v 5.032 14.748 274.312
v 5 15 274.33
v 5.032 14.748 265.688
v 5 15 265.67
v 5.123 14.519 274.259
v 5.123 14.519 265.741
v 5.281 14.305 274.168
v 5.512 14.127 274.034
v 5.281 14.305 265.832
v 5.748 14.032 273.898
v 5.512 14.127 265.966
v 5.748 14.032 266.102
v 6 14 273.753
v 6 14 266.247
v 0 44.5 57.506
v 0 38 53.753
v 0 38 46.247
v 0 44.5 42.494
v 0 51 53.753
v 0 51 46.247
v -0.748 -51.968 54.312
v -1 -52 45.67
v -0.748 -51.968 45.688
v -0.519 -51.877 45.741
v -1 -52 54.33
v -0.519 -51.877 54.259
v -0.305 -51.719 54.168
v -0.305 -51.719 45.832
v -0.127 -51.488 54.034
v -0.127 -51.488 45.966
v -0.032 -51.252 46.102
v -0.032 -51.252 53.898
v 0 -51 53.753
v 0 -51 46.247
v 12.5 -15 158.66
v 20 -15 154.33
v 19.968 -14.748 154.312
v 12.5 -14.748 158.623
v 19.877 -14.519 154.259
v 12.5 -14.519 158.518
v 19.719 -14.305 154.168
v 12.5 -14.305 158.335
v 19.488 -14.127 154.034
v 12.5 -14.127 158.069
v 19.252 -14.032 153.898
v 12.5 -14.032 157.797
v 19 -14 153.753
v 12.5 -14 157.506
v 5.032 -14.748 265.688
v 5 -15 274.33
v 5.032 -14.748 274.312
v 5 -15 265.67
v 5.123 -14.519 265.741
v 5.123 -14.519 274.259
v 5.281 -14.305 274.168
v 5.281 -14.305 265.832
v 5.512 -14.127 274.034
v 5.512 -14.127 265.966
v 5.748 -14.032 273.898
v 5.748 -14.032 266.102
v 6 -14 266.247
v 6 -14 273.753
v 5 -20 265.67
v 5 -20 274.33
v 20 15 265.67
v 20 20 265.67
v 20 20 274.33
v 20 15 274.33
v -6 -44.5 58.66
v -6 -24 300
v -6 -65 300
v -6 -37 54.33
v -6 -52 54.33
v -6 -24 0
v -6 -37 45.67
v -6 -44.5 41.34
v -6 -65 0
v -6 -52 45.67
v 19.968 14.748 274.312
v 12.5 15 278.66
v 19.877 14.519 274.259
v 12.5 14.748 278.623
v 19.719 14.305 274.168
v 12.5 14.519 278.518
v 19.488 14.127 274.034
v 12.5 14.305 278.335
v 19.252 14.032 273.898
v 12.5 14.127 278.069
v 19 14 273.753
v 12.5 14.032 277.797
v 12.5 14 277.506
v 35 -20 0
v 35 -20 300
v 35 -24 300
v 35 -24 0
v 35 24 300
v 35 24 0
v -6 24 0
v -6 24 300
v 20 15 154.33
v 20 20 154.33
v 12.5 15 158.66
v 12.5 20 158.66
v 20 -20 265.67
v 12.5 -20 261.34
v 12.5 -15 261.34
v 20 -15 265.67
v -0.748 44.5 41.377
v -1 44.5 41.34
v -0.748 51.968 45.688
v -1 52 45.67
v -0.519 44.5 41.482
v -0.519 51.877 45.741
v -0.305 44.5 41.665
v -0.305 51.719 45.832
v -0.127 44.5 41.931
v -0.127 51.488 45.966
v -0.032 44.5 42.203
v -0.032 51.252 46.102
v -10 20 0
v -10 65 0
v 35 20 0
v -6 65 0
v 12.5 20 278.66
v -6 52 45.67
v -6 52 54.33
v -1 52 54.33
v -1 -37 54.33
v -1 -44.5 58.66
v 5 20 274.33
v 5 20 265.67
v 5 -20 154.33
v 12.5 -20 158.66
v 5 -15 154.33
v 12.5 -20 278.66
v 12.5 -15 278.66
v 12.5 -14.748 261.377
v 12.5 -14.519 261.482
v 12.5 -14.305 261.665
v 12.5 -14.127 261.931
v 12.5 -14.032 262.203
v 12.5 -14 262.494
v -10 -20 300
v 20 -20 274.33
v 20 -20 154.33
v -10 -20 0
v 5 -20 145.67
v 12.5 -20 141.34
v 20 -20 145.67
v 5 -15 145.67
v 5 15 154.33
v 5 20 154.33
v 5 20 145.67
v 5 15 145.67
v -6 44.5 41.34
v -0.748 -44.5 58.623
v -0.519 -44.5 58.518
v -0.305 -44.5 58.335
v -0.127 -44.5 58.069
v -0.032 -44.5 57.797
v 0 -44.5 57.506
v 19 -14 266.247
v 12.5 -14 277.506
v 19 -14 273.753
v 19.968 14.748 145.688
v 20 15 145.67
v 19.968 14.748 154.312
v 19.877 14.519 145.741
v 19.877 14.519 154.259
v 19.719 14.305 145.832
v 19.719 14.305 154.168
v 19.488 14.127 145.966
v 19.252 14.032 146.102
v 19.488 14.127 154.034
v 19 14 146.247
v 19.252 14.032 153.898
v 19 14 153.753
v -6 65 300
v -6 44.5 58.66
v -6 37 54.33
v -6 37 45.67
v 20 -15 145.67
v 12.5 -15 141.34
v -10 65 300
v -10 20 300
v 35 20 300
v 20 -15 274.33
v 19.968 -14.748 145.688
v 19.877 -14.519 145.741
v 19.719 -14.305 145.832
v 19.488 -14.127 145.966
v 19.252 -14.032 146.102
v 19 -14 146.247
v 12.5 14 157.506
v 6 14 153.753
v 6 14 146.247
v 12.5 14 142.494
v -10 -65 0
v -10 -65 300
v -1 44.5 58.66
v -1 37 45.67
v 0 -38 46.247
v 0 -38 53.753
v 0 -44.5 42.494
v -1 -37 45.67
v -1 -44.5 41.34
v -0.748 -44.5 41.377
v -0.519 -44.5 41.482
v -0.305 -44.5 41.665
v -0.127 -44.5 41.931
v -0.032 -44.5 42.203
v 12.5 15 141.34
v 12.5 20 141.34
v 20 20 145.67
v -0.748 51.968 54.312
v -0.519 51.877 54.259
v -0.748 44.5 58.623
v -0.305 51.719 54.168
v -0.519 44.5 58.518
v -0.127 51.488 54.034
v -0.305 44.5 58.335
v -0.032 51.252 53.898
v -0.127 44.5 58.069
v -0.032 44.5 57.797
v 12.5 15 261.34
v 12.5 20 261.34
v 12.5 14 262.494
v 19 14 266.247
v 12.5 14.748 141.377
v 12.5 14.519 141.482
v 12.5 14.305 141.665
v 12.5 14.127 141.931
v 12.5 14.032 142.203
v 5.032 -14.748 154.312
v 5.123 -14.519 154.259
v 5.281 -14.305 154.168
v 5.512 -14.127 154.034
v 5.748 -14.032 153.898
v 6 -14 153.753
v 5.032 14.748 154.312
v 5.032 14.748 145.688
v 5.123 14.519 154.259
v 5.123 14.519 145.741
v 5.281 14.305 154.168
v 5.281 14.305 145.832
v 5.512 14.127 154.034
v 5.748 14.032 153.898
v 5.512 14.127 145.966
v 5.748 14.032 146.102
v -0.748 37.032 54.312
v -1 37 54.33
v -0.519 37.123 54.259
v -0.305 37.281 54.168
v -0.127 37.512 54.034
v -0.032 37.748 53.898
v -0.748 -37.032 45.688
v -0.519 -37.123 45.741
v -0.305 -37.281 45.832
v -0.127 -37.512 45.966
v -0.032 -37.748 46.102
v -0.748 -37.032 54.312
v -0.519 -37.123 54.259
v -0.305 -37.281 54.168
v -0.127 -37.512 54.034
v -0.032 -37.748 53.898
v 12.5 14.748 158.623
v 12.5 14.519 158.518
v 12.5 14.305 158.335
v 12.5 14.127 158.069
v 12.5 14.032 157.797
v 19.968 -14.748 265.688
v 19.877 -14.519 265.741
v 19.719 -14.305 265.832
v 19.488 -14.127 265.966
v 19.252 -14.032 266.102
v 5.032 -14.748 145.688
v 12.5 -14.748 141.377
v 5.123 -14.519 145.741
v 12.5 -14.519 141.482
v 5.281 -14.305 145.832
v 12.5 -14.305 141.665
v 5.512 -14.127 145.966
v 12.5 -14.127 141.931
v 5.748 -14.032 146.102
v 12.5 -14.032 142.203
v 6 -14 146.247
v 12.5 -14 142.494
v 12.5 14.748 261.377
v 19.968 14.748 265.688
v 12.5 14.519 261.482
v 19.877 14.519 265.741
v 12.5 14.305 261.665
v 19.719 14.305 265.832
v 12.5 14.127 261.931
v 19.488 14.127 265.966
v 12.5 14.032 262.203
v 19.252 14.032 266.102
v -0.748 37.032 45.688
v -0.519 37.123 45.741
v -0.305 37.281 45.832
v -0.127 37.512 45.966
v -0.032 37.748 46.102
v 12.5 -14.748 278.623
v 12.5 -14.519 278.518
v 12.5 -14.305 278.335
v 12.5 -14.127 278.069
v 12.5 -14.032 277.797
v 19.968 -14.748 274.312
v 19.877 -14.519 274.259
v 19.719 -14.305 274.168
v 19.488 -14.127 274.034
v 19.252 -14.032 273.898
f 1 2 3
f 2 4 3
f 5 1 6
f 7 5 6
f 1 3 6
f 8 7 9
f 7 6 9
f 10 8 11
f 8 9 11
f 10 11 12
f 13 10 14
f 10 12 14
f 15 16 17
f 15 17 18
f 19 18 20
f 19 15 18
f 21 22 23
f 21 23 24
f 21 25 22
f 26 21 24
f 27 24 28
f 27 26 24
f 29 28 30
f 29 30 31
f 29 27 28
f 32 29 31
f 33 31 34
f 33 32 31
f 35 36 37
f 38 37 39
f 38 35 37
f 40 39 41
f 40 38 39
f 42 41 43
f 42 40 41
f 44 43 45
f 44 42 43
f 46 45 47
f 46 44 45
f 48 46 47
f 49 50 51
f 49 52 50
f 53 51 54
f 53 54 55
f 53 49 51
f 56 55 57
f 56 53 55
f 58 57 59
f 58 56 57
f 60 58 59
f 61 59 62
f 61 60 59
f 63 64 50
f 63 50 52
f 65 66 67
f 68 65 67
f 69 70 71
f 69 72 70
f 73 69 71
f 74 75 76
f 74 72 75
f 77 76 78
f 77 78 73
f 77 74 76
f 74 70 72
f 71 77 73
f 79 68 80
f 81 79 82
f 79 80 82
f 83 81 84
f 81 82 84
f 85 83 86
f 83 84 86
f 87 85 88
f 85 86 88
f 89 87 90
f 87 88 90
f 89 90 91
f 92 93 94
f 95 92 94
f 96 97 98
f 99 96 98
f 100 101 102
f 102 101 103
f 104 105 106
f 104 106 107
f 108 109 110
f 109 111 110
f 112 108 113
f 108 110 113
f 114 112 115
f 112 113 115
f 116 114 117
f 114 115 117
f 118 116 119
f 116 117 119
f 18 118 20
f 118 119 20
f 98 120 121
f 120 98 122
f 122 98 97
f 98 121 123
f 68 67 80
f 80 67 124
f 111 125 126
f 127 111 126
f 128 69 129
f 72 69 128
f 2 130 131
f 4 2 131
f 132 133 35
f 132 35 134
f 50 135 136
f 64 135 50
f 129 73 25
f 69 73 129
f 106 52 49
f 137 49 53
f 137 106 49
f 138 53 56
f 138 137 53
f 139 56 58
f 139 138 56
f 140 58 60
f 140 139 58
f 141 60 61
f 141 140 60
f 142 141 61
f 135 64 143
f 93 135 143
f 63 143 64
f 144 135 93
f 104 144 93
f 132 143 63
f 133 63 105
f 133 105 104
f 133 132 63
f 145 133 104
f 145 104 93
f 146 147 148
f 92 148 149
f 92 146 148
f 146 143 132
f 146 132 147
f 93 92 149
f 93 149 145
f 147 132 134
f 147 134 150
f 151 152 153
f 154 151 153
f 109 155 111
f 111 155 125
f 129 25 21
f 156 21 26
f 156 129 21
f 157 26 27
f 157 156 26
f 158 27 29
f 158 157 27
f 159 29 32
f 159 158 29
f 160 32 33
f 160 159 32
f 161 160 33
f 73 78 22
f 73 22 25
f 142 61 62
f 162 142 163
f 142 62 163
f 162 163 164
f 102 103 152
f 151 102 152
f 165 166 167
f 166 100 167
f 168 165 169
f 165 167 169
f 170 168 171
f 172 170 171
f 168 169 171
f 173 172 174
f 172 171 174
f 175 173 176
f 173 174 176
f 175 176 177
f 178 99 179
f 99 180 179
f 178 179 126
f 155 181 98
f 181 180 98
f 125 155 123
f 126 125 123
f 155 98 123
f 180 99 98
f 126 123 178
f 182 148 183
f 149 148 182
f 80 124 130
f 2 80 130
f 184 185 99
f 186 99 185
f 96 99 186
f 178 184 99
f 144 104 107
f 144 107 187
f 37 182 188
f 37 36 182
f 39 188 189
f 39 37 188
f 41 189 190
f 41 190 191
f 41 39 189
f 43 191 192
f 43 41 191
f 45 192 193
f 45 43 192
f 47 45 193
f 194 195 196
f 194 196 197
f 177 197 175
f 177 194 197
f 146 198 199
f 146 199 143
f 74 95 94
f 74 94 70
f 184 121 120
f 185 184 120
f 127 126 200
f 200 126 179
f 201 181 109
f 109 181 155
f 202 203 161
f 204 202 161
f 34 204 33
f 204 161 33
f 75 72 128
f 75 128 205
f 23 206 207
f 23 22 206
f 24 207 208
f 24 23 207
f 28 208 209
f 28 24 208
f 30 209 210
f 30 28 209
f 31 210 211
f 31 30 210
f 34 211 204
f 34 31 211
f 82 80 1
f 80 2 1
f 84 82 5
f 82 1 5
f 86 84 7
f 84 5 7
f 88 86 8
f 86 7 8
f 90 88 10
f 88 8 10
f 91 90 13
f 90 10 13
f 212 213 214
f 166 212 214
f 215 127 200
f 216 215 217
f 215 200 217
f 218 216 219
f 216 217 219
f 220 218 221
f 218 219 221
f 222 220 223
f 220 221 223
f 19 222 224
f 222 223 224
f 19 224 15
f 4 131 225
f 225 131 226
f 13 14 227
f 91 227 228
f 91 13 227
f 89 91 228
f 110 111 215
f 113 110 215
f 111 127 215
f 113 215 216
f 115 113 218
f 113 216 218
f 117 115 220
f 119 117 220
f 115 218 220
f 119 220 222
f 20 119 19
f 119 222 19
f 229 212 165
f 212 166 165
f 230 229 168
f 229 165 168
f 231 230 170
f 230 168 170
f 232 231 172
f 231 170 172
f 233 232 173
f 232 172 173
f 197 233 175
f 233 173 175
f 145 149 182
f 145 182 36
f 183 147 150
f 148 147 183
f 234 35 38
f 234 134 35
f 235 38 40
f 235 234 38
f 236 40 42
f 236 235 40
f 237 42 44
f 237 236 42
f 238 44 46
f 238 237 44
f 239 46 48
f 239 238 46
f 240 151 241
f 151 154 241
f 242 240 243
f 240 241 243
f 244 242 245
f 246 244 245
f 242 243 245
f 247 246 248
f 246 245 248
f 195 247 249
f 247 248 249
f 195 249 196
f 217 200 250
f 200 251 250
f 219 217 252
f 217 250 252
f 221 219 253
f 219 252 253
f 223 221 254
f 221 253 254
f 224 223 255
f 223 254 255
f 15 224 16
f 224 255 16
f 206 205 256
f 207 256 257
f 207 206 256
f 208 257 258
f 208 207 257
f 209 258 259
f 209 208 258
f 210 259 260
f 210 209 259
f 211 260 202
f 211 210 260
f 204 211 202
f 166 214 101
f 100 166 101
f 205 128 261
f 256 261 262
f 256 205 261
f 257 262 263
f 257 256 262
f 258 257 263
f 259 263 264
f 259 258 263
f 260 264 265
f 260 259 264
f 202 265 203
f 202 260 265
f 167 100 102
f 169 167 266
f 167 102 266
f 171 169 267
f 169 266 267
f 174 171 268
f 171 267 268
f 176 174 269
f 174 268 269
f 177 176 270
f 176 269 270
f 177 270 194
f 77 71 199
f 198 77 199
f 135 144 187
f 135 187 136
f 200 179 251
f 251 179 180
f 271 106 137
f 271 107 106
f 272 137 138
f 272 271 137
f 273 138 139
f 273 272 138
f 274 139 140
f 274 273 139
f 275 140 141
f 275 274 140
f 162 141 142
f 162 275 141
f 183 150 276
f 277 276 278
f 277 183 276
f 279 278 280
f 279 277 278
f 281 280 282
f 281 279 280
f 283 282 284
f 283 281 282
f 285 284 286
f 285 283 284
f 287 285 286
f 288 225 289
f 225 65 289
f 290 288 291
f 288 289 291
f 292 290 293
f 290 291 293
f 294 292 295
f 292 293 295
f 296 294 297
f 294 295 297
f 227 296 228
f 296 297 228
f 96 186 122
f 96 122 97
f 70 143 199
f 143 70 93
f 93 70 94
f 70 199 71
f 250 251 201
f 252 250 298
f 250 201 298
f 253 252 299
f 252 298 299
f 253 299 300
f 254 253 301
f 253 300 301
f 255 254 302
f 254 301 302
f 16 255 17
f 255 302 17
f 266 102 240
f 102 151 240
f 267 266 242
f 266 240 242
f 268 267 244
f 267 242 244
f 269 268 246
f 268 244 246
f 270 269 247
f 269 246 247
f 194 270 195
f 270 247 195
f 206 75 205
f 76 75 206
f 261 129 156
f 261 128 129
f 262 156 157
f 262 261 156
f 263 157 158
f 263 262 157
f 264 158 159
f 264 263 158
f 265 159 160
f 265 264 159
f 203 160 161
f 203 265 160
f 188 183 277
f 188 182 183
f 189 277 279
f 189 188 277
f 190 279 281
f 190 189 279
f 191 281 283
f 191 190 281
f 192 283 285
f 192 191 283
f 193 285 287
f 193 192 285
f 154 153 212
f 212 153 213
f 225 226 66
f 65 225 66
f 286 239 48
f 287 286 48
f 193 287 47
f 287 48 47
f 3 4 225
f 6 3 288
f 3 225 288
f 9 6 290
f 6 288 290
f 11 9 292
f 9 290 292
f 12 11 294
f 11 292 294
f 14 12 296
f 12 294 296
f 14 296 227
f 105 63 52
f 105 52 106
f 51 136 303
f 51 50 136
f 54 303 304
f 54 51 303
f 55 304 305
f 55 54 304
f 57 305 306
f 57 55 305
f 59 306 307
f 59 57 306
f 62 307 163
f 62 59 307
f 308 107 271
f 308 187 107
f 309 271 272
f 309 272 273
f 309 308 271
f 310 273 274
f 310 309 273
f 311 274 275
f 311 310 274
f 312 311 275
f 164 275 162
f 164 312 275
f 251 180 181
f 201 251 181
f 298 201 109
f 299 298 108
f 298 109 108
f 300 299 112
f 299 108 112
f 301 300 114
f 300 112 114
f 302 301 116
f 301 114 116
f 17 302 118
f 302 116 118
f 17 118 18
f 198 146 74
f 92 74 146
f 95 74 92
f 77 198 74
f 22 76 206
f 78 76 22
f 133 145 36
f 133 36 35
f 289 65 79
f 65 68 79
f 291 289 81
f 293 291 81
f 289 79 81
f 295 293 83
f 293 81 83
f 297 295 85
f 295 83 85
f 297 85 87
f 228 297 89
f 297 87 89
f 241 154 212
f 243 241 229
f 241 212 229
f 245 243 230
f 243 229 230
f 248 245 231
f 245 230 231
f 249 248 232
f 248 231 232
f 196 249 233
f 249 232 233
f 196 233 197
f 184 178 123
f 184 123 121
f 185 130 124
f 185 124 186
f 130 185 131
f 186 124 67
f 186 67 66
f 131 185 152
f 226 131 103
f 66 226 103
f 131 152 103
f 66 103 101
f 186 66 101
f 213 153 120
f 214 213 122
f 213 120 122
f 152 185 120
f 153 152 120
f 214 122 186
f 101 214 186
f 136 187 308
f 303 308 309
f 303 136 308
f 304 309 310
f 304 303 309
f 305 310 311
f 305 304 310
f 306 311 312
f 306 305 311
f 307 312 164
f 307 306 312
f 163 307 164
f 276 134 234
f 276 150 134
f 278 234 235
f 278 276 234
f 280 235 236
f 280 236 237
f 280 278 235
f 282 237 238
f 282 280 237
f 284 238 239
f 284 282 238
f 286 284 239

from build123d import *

# Parameters (mm, degrees)
F1_DEPTH = 300
F3_DEPTH = 6
F4_R     = 1
F6_DEPTH = 6
F7_R     = 1


with BuildPart() as f1:
    # F0 (on Top) → F1 (new body)
    with BuildSketch(Plane.XY):
        Polygon((-10, 65), (-10, 20), (35, 20), (35, 24), (-6, 24), (-6, 65), align=None)
    extrude(amount=F1_DEPTH)

    # F2 (on face) → F3 (join)
    with BuildSketch(Plane.XZ.offset(-20)):
        Polygon((12.5, 261.339746), (20, 265.669873), (20, 274.330127), (12.5, 278.660254), (5, 274.330127), (5, 265.669873), align=None)
        Polygon((12.5, 141.339746), (20, 145.669873), (20, 154.330127), (12.5, 158.660254), (5, 154.330127), (5, 145.669873), align=None)
    extrude(amount=F3_DEPTH)

    # F4
    f4_edges = [f1.edges().sort_by_distance(p)[0] for p in [
        (16.25, 14, 263.504809),
        (20, 14, 270),
        (16.25, 14, 276.495191),
        (8.75, 14, 276.495191),
        (5, 14, 270),
        (8.75, 14, 263.504809),
        (16.25, 14, 143.504809),
        (20, 14, 150),
        (16.25, 14, 156.495191),
        (8.75, 14, 156.495191),
        (5, 14, 150),
        (8.75, 14, 143.504809),
    ]]
    fillet(f4_edges, radius=F4_R)

    # F5 (on face) → F6 (join)
    with BuildSketch(Plane.YZ.offset(-6)):
        Polygon((44.5, 41.339746), (52, 45.669873), (52, 54.330127), (44.5, 58.660254), (37, 54.330127), (37, 45.669873), align=None)
    extrude(amount=F6_DEPTH)

    # F7
    f7_edges = [f1.edges().sort_by_distance(p)[0] for p in [
        (0, 48.25, 43.504809),
        (0, 52, 50),
        (0, 48.25, 56.495191),
        (0, 40.75, 56.495191),
        (0, 37, 50),
        (0, 40.75, 43.504809),
    ]]
    fillet(f7_edges, radius=F7_R)


with BuildPart() as f8_1:
    # F8: instance of F1
    add(f1.part.mirror(Plane.XZ))


solid = Compound([f1.part, f8_1.part])
